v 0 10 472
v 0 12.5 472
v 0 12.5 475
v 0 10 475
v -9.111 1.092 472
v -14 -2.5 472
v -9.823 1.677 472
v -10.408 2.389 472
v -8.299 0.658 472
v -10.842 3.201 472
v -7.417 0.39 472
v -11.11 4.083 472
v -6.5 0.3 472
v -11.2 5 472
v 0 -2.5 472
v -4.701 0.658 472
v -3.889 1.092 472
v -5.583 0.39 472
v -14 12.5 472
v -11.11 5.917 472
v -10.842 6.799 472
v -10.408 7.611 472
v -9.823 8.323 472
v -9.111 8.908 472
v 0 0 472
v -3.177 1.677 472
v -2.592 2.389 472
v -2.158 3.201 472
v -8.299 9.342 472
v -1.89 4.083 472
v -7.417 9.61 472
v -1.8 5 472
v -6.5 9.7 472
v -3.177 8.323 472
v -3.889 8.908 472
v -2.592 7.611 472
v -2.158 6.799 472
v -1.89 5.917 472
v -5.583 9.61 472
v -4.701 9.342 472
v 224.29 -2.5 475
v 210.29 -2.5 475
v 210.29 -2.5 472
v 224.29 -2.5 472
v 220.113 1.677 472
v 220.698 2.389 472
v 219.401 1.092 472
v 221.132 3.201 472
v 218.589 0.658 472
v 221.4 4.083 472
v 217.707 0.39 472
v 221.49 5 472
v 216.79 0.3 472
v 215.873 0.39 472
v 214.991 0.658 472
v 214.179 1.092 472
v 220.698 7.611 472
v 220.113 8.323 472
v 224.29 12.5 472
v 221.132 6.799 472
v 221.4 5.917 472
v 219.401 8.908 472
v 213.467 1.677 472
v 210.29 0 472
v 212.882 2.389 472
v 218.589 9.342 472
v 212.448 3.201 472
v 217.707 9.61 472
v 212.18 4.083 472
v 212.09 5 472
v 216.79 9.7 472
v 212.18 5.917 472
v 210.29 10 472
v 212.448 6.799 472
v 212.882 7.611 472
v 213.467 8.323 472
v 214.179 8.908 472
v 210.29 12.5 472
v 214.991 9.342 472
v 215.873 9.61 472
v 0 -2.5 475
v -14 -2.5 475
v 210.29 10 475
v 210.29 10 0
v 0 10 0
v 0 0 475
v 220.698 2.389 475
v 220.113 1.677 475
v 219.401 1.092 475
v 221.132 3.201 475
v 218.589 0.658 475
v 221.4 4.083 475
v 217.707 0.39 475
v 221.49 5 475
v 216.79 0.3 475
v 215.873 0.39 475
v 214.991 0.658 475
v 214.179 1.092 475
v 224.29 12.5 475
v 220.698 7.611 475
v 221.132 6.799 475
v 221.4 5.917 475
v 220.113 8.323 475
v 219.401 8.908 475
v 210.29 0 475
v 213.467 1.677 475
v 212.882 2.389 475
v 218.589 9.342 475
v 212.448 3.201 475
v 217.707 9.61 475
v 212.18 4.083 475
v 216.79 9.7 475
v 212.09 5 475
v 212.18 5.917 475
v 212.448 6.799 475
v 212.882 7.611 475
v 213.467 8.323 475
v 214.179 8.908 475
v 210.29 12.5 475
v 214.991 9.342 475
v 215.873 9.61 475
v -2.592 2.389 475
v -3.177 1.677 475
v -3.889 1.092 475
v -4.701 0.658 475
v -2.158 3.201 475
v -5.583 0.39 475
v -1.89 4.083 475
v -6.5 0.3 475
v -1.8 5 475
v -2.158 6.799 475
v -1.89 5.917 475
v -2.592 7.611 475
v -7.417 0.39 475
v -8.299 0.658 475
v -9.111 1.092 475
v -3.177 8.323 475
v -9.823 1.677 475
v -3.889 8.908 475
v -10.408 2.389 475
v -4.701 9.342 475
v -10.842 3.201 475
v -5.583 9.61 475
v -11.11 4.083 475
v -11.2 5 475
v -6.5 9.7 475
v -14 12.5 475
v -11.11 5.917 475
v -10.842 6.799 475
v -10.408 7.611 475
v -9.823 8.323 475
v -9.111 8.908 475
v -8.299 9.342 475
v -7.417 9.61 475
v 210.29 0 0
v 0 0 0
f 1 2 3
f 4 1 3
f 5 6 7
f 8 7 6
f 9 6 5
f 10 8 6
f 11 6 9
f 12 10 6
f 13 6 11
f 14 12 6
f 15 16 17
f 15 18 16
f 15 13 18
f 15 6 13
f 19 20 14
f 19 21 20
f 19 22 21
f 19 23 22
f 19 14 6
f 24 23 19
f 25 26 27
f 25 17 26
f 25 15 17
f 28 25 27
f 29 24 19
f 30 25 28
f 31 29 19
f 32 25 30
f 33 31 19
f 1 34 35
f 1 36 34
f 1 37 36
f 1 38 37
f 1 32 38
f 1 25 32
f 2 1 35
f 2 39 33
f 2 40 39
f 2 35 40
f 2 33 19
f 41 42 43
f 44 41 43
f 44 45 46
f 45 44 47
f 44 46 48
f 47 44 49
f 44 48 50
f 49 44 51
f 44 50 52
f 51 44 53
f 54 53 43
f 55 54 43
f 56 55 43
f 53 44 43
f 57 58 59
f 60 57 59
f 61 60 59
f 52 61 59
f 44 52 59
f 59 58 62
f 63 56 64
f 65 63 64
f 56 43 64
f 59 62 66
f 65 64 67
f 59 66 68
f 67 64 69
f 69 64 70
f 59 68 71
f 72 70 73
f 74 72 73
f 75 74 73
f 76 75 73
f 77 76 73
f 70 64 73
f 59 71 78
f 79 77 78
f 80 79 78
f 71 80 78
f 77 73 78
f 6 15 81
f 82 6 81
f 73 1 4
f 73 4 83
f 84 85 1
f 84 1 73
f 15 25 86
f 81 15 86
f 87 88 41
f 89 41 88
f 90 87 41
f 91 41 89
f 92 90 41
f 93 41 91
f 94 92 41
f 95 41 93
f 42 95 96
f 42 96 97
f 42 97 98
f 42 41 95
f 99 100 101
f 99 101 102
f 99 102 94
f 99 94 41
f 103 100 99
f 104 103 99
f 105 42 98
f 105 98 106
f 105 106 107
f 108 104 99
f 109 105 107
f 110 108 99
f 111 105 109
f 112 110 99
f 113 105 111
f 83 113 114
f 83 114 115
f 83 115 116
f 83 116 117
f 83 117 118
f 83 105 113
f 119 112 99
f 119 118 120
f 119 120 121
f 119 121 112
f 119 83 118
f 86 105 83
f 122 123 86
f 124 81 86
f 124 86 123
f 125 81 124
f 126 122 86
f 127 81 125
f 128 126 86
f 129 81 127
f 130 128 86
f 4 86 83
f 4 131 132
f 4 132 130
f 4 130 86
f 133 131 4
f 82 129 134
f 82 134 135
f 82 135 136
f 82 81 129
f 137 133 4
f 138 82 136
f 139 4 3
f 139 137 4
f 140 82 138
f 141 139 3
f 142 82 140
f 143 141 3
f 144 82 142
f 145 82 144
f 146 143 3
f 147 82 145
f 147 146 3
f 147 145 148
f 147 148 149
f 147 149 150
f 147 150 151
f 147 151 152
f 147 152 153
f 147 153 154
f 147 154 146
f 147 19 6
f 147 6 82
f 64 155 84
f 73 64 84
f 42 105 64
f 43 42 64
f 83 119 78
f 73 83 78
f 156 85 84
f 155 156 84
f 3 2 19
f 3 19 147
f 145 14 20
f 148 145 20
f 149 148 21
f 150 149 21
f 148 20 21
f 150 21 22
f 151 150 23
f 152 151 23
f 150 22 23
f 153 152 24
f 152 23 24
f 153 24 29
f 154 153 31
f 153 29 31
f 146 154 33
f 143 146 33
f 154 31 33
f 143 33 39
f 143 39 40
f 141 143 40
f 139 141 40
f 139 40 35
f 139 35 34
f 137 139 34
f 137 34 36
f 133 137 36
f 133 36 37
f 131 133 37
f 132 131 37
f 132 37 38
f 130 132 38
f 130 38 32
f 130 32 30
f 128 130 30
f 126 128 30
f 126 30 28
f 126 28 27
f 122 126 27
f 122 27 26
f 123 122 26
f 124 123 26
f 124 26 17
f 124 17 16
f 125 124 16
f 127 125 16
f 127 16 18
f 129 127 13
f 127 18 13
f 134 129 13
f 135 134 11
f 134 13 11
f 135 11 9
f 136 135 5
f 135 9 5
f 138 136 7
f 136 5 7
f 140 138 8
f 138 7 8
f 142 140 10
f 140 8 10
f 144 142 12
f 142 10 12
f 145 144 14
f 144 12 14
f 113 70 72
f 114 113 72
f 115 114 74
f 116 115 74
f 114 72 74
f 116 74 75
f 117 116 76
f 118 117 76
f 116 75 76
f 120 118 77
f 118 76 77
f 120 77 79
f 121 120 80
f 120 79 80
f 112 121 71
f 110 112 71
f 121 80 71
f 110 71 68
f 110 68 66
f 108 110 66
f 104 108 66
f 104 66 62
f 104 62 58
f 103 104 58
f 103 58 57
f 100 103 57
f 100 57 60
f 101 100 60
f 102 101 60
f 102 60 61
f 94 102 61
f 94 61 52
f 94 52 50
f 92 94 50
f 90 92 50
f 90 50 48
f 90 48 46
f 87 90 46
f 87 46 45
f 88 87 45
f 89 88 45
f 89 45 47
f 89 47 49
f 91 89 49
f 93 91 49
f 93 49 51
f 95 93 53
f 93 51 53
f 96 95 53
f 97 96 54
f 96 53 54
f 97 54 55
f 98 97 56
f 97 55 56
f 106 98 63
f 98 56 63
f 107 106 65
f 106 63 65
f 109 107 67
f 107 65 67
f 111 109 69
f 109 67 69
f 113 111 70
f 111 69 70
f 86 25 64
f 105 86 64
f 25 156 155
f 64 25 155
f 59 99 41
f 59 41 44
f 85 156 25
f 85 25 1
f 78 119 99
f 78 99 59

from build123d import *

# Parameters (mm, degrees)
SKETCH1_W           = 210.29
SKETCH1_H           = 10
BOSS_EXTRUDE1_DEPTH = 475
SKETCH2_W           = 3
SKETCH2_H           = 15
BOSS_EXTRUDE2_DEPTH = 14
SKETCH4_W           = 3
SKETCH4_H           = 15
BOSS_EXTRUDE3_DEPTH = 14
SKETCH3_R           = 4.7
CUT_EXTRUDE1_DEPTH  = 13


with BuildPart() as part:
    # Sketch1 → Boss-Extrude1 (new body)
    with BuildSketch(Plane.XY):
        with Locations((105.145, 5)):
            Rectangle(SKETCH1_W, SKETCH1_H)
    extrude(amount=BOSS_EXTRUDE1_DEPTH)

    # Sketch2 → Boss-Extrude2 (add)
    with BuildSketch(Plane.ZY):
        with Locations((473.5, 5)):
            Rectangle(SKETCH2_W, SKETCH2_H)
    extrude(amount=BOSS_EXTRUDE2_DEPTH)

    # Sketch4 → Boss-Extrude3 (add)
    with BuildSketch(Plane(origin=(210.29, 0, 0), x_dir=(0, 0, -1), z_dir=(1, 0, 0))):
        with Locations((-473.5, 5)):
            Rectangle(SKETCH4_W, SKETCH4_H)
    extrude(amount=BOSS_EXTRUDE3_DEPTH)

    # Sketch3 → Cut-Extrude1 (cut)
    with BuildSketch(Plane(origin=(0, 0, 472), x_dir=(-1, 0, 0), z_dir=(0, 0, -1))):
        with Locations((6.5, 5)):
            Circle(SKETCH3_R)
        with Locations((-216.79, 5)):
            Circle(SKETCH3_R)
    extrude(amount=-CUT_EXTRUDE1_DEPTH, mode=Mode.SUBTRACT)


solid = part.part
